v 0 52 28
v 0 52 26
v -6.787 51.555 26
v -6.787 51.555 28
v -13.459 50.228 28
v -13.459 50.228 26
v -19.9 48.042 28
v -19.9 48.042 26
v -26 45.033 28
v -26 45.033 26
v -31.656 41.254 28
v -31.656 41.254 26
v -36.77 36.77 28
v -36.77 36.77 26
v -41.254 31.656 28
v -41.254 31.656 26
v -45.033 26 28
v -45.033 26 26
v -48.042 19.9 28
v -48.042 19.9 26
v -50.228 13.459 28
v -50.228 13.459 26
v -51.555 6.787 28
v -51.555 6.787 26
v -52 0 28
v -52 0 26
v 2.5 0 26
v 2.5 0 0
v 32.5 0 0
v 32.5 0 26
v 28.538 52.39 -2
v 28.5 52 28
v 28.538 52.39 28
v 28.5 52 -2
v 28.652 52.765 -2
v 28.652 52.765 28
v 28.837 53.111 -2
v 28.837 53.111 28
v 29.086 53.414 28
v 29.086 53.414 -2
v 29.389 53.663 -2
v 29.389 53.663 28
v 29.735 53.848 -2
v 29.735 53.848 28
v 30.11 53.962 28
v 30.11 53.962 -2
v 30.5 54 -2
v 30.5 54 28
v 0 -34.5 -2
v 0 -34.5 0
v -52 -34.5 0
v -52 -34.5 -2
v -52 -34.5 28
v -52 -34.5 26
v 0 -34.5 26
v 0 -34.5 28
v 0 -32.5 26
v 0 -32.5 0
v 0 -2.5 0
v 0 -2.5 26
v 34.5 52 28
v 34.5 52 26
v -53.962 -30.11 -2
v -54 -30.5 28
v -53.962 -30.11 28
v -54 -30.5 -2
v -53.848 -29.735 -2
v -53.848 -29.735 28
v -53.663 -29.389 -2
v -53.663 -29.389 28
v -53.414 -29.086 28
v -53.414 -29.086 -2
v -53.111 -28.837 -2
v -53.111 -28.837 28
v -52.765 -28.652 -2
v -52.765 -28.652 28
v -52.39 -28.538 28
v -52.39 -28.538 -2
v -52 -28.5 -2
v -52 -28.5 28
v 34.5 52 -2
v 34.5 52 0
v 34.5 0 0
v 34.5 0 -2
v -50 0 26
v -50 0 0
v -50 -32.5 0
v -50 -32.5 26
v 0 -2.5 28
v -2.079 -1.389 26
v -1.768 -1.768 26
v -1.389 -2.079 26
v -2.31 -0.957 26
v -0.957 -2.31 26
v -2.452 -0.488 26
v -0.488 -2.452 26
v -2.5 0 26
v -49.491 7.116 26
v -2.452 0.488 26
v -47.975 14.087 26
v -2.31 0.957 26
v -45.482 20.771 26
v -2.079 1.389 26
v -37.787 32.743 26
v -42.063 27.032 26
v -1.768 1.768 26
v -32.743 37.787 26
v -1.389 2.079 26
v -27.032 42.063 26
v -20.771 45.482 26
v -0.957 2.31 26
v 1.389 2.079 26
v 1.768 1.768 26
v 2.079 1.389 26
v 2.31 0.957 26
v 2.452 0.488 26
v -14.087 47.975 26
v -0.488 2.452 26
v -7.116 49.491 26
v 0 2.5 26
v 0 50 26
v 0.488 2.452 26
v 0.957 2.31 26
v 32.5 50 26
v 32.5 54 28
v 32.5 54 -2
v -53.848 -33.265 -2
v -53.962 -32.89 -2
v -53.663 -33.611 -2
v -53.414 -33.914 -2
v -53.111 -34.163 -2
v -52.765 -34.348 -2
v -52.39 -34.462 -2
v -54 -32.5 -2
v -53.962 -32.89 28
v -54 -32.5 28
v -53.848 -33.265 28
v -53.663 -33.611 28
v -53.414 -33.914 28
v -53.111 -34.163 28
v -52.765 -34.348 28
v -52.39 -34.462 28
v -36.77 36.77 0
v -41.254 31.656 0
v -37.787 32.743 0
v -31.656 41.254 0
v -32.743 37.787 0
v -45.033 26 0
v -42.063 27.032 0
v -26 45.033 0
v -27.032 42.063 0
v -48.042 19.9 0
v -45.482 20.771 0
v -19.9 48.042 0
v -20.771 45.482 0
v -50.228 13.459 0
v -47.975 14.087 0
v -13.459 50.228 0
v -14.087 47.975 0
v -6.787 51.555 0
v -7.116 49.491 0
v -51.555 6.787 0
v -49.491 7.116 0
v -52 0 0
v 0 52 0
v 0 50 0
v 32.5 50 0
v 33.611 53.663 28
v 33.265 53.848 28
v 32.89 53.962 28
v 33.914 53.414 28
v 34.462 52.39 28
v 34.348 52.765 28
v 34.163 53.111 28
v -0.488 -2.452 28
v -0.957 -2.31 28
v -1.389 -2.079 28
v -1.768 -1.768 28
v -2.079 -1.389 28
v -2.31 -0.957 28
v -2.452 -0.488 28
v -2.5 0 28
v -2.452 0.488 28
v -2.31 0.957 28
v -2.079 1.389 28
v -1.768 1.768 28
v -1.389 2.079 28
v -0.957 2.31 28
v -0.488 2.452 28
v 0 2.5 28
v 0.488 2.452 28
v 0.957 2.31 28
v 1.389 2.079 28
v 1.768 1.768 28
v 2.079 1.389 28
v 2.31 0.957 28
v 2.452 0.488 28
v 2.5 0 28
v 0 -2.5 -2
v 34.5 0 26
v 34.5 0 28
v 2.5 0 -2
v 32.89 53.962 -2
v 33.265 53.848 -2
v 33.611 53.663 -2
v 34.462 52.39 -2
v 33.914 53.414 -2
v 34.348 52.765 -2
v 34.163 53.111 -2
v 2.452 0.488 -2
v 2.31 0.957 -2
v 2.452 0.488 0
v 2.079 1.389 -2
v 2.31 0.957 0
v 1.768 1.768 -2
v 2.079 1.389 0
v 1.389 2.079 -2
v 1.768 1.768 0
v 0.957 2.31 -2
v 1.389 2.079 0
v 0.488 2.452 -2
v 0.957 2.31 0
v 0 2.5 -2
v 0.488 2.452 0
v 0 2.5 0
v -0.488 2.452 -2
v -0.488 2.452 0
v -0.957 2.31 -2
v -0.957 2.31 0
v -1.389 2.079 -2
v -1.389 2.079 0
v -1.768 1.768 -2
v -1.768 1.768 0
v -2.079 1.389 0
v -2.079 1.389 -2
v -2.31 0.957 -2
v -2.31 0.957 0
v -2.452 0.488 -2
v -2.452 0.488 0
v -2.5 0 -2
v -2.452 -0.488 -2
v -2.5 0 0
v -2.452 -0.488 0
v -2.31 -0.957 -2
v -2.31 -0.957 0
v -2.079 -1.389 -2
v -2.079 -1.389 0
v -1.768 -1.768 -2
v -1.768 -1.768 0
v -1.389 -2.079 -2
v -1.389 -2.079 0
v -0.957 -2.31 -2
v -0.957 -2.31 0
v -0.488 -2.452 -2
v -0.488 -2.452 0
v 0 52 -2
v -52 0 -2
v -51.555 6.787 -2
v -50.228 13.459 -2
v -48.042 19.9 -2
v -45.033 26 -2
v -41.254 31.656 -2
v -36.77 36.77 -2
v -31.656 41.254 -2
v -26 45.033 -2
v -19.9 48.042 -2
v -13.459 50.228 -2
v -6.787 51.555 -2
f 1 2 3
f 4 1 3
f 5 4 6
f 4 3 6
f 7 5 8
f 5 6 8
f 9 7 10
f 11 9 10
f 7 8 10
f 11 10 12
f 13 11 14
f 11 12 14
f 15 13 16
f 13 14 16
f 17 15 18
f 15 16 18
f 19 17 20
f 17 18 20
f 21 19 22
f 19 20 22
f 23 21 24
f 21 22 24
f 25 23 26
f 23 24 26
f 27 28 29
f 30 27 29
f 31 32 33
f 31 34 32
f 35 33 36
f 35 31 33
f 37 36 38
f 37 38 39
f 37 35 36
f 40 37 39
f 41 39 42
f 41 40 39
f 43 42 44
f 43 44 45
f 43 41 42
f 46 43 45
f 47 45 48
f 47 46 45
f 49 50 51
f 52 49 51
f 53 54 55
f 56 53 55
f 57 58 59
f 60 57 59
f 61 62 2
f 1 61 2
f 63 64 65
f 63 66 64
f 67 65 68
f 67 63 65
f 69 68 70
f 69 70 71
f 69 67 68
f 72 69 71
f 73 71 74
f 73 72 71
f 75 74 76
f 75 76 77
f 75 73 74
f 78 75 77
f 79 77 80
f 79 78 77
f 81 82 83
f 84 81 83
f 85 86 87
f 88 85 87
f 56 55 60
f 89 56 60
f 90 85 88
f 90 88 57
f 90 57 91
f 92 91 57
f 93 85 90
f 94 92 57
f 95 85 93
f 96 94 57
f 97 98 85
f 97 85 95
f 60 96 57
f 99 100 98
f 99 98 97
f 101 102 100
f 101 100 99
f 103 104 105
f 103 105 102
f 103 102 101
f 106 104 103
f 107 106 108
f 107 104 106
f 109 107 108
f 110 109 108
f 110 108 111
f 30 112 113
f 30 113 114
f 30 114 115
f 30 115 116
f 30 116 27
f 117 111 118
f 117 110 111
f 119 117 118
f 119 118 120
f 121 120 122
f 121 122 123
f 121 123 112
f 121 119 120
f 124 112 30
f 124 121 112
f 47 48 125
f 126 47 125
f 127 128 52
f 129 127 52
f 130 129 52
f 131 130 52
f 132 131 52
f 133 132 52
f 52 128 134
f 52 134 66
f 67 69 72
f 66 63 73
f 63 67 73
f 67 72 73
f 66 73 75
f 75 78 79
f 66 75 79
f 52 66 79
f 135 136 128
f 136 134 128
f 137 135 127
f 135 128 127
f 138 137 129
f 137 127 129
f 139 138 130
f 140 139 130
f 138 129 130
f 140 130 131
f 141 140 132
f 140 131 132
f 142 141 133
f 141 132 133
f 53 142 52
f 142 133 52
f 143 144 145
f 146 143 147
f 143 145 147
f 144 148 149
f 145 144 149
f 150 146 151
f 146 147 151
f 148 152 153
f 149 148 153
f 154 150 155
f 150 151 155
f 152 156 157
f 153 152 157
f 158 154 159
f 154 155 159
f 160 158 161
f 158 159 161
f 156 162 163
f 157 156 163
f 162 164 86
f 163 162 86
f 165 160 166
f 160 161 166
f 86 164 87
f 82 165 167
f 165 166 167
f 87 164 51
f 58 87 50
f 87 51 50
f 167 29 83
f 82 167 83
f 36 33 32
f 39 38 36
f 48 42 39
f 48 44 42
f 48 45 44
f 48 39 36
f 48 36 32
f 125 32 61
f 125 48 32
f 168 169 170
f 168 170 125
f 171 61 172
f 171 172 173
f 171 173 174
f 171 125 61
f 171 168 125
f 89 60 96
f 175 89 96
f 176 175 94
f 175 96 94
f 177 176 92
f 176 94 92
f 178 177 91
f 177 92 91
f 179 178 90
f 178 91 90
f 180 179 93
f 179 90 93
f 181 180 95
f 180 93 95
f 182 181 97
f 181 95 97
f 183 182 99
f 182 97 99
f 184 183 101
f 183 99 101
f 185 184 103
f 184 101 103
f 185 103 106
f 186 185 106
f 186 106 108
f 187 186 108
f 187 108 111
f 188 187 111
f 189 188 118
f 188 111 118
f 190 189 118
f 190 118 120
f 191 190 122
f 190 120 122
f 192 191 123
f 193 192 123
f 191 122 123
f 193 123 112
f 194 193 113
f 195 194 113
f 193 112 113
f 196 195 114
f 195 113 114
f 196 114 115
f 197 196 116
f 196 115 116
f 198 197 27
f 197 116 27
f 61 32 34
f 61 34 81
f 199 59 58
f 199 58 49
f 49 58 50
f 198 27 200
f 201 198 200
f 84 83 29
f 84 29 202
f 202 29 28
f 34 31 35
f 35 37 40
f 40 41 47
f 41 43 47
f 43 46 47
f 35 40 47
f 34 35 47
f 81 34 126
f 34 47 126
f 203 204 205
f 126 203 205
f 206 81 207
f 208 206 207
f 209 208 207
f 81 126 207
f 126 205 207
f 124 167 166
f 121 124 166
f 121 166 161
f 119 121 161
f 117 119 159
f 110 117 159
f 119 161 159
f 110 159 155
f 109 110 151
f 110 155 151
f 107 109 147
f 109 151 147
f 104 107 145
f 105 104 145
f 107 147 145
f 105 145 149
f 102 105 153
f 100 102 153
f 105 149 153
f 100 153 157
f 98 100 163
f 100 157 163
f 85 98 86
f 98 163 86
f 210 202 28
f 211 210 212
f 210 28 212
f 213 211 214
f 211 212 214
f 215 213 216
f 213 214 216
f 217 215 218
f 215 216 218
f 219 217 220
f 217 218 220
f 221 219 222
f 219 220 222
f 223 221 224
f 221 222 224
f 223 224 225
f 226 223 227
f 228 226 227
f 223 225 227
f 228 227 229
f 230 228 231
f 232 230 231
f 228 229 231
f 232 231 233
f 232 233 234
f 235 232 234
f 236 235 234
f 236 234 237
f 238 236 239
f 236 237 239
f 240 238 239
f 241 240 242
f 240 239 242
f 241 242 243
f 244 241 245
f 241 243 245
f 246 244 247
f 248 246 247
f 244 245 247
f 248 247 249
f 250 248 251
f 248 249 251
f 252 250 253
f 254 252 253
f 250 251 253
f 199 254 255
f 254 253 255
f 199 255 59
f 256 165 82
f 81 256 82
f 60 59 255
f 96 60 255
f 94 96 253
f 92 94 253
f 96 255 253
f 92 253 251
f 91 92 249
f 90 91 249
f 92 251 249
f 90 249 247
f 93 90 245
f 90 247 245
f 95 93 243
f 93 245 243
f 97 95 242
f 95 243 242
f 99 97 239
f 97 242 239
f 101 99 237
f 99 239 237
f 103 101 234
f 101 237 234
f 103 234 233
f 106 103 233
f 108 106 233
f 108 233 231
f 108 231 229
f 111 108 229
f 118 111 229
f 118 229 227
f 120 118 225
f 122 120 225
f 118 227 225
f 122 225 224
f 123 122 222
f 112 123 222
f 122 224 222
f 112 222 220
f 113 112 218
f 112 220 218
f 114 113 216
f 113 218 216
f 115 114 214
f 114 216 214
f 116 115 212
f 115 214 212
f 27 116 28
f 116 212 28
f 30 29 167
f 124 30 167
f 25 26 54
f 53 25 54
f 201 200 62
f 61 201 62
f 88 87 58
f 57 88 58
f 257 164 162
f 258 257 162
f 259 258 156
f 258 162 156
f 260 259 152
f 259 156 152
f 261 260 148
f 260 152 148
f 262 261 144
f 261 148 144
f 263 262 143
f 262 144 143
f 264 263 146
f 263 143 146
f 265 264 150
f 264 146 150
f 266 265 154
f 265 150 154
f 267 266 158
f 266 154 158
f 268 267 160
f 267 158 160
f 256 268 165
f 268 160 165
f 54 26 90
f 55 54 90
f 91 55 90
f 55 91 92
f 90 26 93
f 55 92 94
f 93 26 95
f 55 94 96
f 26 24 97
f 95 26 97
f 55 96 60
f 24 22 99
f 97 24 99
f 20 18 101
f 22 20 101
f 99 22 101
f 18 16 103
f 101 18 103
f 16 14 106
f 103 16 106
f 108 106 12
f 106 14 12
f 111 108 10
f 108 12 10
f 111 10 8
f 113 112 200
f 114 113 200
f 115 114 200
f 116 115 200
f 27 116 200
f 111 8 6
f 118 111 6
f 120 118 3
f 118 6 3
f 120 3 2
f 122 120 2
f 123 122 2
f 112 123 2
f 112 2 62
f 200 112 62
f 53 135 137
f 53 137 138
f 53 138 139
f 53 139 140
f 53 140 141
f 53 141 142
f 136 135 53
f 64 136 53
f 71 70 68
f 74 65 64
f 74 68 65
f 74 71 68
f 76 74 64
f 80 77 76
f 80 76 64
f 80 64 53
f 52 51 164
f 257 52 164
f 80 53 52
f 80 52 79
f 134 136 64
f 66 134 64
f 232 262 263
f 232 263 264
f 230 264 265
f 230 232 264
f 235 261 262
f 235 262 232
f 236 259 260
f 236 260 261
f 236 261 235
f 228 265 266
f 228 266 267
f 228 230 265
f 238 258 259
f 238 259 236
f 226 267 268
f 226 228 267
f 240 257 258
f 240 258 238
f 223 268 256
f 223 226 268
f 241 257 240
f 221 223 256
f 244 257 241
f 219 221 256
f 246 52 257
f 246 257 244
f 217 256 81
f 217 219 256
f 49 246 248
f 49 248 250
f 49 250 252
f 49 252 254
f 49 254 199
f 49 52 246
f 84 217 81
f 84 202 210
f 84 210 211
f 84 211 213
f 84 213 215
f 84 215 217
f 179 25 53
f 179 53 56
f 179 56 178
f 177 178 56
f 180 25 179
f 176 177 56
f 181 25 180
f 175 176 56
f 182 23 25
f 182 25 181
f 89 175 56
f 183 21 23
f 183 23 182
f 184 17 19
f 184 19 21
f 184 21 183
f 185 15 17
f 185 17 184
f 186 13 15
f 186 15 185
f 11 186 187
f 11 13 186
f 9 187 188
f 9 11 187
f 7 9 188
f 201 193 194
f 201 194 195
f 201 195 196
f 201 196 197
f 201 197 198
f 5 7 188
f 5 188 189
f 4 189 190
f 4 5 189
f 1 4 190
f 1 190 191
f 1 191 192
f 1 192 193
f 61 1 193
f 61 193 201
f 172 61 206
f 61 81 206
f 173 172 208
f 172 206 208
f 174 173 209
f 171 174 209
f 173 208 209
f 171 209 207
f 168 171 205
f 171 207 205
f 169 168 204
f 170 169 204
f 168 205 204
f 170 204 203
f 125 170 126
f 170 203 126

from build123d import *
from build123d import SkipClean  # not in build123d's __all__

# Parameters (mm, degrees)
F1_DEPTH = 26
F3_DEPTH = 2
F5_DEPTH = 2
F6_W     = 2
F6_H     = 6
F7_DEPTH = 30
F6_W_2   = 6
F6_H_2   = 2
F8_R     = 1.99999
F8_2_R   = 1.99999


# Not quite as in the source:
# - a fillet or chamfer is up to 0.001 mm smaller than in the source, because OpenCascade refuses the exact size


with BuildPart() as f1:
    # F0 (on Top) → F1 (new body)
    with BuildSketch(Plane.XY):
        with BuildLine():
            ThreePointArc((0, -2.5), (-1.767766953, 1.767766953), (2.5, 0))
            Line((2.5, 0), (32.5, 0))
            Line((32.5, 0), (32.5, 50))
            Line((32.5, 50), (0, 50))
            ThreePointArc((0, 50), (-35.3553390593, 35.3553390593), (-50, 0))
            Line((-50, 0), (-50, -32.5))
            Line((-50, -32.5), (0, -32.5))
            Line((0, -32.5), (0, -2.5))
        make_face()
    extrude(amount=F1_DEPTH)

    # F4 (on face) → F5 (join)
    with BuildSketch(Plane(origin=(0, 0, 0), x_dir=(1, 0, 0), z_dir=(0, 0, -1))):
        with BuildLine():
            Line((0, 34.5), (-52, 34.5))
            Line((-52, 34.5), (-52, 0))
            ThreePointArc((-52, 0), (-36.7695526217, -36.7695526217), (0, -52))
            Line((0, -52), (34.5, -52))
            Line((34.5, -52), (34.5, 0))
            Line((34.5, 0), (32.5, 0))
            Line((32.5, 0), (32.5, -50))
            Line((32.5, -50), (0, -50))
            ThreePointArc((0, -50), (-35.3553390593, -35.3553390593), (-50, 0))
            Line((-50, 0), (-50, 32.5))
            Line((-50, 32.5), (0, 32.5))
            Line((0, 32.5), (0, 34.5))
        make_face()
        with BuildLine():
            Line((0, 2.5), (0, 32.5))
            Line((0, 32.5), (-50, 32.5))
            Line((-50, 32.5), (-50, 0))
            ThreePointArc((-50, 0), (-35.3553390593, -35.3553390593), (0, -50))
            Line((0, -50), (32.5, -50))
            Line((32.5, -50), (32.5, 0))
            Line((32.5, 0), (2.5, 0))
            ThreePointArc((2.5, 0), (-1.767766953, -1.767766953), (0, 2.5))
        make_face()
    with SkipClean():  # cleaning this boolean's faces spoils the solid; the shape is the same uncleaned
        extrude(amount=F5_DEPTH)


with BuildPart() as f3:
    # F2 (on face) → F3 (new body)
    with BuildSketch(Plane.XY.offset(26)):
        with BuildLine():
            Line((34.5, 0), (34.5, 52))
            Line((34.5, 52), (0, 52))
            ThreePointArc((0, 52), (-36.7695526217, 36.7695526217), (-52, 0))
            Line((-52, 0), (-52, -34.5))
            Line((-52, -34.5), (0, -34.5))
            Line((0, -34.5), (0, -32.5))
            Line((0, -32.5), (-50, -32.5))
            Line((-50, -32.5), (-50, 0))
            ThreePointArc((-50, 0), (-35.3553390593, 35.3553390593), (0, 50))
            Line((0, 50), (32.5, 50))
            Line((32.5, 50), (32.5, 0))
            Line((32.5, 0), (34.5, 0))
        make_face()
        with BuildLine():
            Line((2.5, 0), (32.5, 0))
            Line((32.5, 0), (32.5, 50))
            Line((32.5, 50), (0, 50))
            ThreePointArc((0, 50), (-35.3553390593, 35.3553390593), (-50, 0))
            Line((-50, 0), (-50, -32.5))
            Line((-50, -32.5), (0, -32.5))
            Line((0, -32.5), (0, -2.5))
            ThreePointArc((0, -2.5), (-1.767766953, 1.767766953), (2.5, 0))
        make_face()
    extrude(amount=F3_DEPTH)


with BuildPart() as f7:
    # F6 (on face) → F7 (new body, through all)
    with BuildSketch(Plane.XY.offset(28)):
        with Locations((-53, -31.5)):
            Rectangle(F6_W, F6_H)
    extrude(amount=-F7_DEPTH)

    # F8#2 (radius 2 in the source; OpenCascade refuses exactly that, so slightly less here)
    f8_2_edges = [f7.edges().sort_by_distance(p)[0] for p in [
        (-54, -28.5, 13),
        (-54, -34.5, 13),
    ]]
    fillet(f8_2_edges, radius=F8_2_R)


with BuildPart() as f7b:
    # F6 (on face) → F7, piece 2 (new body, through all)
    with BuildSketch(Plane.XY.offset(28)):
        with Locations((31.5, 53)):
            Rectangle(F6_W_2, F6_H_2)
    extrude(amount=-F7_DEPTH)

    # F8 (radius 2 in the source; OpenCascade refuses exactly that, so slightly less here)
    f8_edges = [f7b.edges().sort_by_distance(p)[0] for p in [
        (28.5, 54, 13),
        (34.5, 54, 13),
    ]]
    fillet(f8_edges, radius=F8_R)


solid = Compound([f1.part, f3.part, f7.part, f7b.part])
